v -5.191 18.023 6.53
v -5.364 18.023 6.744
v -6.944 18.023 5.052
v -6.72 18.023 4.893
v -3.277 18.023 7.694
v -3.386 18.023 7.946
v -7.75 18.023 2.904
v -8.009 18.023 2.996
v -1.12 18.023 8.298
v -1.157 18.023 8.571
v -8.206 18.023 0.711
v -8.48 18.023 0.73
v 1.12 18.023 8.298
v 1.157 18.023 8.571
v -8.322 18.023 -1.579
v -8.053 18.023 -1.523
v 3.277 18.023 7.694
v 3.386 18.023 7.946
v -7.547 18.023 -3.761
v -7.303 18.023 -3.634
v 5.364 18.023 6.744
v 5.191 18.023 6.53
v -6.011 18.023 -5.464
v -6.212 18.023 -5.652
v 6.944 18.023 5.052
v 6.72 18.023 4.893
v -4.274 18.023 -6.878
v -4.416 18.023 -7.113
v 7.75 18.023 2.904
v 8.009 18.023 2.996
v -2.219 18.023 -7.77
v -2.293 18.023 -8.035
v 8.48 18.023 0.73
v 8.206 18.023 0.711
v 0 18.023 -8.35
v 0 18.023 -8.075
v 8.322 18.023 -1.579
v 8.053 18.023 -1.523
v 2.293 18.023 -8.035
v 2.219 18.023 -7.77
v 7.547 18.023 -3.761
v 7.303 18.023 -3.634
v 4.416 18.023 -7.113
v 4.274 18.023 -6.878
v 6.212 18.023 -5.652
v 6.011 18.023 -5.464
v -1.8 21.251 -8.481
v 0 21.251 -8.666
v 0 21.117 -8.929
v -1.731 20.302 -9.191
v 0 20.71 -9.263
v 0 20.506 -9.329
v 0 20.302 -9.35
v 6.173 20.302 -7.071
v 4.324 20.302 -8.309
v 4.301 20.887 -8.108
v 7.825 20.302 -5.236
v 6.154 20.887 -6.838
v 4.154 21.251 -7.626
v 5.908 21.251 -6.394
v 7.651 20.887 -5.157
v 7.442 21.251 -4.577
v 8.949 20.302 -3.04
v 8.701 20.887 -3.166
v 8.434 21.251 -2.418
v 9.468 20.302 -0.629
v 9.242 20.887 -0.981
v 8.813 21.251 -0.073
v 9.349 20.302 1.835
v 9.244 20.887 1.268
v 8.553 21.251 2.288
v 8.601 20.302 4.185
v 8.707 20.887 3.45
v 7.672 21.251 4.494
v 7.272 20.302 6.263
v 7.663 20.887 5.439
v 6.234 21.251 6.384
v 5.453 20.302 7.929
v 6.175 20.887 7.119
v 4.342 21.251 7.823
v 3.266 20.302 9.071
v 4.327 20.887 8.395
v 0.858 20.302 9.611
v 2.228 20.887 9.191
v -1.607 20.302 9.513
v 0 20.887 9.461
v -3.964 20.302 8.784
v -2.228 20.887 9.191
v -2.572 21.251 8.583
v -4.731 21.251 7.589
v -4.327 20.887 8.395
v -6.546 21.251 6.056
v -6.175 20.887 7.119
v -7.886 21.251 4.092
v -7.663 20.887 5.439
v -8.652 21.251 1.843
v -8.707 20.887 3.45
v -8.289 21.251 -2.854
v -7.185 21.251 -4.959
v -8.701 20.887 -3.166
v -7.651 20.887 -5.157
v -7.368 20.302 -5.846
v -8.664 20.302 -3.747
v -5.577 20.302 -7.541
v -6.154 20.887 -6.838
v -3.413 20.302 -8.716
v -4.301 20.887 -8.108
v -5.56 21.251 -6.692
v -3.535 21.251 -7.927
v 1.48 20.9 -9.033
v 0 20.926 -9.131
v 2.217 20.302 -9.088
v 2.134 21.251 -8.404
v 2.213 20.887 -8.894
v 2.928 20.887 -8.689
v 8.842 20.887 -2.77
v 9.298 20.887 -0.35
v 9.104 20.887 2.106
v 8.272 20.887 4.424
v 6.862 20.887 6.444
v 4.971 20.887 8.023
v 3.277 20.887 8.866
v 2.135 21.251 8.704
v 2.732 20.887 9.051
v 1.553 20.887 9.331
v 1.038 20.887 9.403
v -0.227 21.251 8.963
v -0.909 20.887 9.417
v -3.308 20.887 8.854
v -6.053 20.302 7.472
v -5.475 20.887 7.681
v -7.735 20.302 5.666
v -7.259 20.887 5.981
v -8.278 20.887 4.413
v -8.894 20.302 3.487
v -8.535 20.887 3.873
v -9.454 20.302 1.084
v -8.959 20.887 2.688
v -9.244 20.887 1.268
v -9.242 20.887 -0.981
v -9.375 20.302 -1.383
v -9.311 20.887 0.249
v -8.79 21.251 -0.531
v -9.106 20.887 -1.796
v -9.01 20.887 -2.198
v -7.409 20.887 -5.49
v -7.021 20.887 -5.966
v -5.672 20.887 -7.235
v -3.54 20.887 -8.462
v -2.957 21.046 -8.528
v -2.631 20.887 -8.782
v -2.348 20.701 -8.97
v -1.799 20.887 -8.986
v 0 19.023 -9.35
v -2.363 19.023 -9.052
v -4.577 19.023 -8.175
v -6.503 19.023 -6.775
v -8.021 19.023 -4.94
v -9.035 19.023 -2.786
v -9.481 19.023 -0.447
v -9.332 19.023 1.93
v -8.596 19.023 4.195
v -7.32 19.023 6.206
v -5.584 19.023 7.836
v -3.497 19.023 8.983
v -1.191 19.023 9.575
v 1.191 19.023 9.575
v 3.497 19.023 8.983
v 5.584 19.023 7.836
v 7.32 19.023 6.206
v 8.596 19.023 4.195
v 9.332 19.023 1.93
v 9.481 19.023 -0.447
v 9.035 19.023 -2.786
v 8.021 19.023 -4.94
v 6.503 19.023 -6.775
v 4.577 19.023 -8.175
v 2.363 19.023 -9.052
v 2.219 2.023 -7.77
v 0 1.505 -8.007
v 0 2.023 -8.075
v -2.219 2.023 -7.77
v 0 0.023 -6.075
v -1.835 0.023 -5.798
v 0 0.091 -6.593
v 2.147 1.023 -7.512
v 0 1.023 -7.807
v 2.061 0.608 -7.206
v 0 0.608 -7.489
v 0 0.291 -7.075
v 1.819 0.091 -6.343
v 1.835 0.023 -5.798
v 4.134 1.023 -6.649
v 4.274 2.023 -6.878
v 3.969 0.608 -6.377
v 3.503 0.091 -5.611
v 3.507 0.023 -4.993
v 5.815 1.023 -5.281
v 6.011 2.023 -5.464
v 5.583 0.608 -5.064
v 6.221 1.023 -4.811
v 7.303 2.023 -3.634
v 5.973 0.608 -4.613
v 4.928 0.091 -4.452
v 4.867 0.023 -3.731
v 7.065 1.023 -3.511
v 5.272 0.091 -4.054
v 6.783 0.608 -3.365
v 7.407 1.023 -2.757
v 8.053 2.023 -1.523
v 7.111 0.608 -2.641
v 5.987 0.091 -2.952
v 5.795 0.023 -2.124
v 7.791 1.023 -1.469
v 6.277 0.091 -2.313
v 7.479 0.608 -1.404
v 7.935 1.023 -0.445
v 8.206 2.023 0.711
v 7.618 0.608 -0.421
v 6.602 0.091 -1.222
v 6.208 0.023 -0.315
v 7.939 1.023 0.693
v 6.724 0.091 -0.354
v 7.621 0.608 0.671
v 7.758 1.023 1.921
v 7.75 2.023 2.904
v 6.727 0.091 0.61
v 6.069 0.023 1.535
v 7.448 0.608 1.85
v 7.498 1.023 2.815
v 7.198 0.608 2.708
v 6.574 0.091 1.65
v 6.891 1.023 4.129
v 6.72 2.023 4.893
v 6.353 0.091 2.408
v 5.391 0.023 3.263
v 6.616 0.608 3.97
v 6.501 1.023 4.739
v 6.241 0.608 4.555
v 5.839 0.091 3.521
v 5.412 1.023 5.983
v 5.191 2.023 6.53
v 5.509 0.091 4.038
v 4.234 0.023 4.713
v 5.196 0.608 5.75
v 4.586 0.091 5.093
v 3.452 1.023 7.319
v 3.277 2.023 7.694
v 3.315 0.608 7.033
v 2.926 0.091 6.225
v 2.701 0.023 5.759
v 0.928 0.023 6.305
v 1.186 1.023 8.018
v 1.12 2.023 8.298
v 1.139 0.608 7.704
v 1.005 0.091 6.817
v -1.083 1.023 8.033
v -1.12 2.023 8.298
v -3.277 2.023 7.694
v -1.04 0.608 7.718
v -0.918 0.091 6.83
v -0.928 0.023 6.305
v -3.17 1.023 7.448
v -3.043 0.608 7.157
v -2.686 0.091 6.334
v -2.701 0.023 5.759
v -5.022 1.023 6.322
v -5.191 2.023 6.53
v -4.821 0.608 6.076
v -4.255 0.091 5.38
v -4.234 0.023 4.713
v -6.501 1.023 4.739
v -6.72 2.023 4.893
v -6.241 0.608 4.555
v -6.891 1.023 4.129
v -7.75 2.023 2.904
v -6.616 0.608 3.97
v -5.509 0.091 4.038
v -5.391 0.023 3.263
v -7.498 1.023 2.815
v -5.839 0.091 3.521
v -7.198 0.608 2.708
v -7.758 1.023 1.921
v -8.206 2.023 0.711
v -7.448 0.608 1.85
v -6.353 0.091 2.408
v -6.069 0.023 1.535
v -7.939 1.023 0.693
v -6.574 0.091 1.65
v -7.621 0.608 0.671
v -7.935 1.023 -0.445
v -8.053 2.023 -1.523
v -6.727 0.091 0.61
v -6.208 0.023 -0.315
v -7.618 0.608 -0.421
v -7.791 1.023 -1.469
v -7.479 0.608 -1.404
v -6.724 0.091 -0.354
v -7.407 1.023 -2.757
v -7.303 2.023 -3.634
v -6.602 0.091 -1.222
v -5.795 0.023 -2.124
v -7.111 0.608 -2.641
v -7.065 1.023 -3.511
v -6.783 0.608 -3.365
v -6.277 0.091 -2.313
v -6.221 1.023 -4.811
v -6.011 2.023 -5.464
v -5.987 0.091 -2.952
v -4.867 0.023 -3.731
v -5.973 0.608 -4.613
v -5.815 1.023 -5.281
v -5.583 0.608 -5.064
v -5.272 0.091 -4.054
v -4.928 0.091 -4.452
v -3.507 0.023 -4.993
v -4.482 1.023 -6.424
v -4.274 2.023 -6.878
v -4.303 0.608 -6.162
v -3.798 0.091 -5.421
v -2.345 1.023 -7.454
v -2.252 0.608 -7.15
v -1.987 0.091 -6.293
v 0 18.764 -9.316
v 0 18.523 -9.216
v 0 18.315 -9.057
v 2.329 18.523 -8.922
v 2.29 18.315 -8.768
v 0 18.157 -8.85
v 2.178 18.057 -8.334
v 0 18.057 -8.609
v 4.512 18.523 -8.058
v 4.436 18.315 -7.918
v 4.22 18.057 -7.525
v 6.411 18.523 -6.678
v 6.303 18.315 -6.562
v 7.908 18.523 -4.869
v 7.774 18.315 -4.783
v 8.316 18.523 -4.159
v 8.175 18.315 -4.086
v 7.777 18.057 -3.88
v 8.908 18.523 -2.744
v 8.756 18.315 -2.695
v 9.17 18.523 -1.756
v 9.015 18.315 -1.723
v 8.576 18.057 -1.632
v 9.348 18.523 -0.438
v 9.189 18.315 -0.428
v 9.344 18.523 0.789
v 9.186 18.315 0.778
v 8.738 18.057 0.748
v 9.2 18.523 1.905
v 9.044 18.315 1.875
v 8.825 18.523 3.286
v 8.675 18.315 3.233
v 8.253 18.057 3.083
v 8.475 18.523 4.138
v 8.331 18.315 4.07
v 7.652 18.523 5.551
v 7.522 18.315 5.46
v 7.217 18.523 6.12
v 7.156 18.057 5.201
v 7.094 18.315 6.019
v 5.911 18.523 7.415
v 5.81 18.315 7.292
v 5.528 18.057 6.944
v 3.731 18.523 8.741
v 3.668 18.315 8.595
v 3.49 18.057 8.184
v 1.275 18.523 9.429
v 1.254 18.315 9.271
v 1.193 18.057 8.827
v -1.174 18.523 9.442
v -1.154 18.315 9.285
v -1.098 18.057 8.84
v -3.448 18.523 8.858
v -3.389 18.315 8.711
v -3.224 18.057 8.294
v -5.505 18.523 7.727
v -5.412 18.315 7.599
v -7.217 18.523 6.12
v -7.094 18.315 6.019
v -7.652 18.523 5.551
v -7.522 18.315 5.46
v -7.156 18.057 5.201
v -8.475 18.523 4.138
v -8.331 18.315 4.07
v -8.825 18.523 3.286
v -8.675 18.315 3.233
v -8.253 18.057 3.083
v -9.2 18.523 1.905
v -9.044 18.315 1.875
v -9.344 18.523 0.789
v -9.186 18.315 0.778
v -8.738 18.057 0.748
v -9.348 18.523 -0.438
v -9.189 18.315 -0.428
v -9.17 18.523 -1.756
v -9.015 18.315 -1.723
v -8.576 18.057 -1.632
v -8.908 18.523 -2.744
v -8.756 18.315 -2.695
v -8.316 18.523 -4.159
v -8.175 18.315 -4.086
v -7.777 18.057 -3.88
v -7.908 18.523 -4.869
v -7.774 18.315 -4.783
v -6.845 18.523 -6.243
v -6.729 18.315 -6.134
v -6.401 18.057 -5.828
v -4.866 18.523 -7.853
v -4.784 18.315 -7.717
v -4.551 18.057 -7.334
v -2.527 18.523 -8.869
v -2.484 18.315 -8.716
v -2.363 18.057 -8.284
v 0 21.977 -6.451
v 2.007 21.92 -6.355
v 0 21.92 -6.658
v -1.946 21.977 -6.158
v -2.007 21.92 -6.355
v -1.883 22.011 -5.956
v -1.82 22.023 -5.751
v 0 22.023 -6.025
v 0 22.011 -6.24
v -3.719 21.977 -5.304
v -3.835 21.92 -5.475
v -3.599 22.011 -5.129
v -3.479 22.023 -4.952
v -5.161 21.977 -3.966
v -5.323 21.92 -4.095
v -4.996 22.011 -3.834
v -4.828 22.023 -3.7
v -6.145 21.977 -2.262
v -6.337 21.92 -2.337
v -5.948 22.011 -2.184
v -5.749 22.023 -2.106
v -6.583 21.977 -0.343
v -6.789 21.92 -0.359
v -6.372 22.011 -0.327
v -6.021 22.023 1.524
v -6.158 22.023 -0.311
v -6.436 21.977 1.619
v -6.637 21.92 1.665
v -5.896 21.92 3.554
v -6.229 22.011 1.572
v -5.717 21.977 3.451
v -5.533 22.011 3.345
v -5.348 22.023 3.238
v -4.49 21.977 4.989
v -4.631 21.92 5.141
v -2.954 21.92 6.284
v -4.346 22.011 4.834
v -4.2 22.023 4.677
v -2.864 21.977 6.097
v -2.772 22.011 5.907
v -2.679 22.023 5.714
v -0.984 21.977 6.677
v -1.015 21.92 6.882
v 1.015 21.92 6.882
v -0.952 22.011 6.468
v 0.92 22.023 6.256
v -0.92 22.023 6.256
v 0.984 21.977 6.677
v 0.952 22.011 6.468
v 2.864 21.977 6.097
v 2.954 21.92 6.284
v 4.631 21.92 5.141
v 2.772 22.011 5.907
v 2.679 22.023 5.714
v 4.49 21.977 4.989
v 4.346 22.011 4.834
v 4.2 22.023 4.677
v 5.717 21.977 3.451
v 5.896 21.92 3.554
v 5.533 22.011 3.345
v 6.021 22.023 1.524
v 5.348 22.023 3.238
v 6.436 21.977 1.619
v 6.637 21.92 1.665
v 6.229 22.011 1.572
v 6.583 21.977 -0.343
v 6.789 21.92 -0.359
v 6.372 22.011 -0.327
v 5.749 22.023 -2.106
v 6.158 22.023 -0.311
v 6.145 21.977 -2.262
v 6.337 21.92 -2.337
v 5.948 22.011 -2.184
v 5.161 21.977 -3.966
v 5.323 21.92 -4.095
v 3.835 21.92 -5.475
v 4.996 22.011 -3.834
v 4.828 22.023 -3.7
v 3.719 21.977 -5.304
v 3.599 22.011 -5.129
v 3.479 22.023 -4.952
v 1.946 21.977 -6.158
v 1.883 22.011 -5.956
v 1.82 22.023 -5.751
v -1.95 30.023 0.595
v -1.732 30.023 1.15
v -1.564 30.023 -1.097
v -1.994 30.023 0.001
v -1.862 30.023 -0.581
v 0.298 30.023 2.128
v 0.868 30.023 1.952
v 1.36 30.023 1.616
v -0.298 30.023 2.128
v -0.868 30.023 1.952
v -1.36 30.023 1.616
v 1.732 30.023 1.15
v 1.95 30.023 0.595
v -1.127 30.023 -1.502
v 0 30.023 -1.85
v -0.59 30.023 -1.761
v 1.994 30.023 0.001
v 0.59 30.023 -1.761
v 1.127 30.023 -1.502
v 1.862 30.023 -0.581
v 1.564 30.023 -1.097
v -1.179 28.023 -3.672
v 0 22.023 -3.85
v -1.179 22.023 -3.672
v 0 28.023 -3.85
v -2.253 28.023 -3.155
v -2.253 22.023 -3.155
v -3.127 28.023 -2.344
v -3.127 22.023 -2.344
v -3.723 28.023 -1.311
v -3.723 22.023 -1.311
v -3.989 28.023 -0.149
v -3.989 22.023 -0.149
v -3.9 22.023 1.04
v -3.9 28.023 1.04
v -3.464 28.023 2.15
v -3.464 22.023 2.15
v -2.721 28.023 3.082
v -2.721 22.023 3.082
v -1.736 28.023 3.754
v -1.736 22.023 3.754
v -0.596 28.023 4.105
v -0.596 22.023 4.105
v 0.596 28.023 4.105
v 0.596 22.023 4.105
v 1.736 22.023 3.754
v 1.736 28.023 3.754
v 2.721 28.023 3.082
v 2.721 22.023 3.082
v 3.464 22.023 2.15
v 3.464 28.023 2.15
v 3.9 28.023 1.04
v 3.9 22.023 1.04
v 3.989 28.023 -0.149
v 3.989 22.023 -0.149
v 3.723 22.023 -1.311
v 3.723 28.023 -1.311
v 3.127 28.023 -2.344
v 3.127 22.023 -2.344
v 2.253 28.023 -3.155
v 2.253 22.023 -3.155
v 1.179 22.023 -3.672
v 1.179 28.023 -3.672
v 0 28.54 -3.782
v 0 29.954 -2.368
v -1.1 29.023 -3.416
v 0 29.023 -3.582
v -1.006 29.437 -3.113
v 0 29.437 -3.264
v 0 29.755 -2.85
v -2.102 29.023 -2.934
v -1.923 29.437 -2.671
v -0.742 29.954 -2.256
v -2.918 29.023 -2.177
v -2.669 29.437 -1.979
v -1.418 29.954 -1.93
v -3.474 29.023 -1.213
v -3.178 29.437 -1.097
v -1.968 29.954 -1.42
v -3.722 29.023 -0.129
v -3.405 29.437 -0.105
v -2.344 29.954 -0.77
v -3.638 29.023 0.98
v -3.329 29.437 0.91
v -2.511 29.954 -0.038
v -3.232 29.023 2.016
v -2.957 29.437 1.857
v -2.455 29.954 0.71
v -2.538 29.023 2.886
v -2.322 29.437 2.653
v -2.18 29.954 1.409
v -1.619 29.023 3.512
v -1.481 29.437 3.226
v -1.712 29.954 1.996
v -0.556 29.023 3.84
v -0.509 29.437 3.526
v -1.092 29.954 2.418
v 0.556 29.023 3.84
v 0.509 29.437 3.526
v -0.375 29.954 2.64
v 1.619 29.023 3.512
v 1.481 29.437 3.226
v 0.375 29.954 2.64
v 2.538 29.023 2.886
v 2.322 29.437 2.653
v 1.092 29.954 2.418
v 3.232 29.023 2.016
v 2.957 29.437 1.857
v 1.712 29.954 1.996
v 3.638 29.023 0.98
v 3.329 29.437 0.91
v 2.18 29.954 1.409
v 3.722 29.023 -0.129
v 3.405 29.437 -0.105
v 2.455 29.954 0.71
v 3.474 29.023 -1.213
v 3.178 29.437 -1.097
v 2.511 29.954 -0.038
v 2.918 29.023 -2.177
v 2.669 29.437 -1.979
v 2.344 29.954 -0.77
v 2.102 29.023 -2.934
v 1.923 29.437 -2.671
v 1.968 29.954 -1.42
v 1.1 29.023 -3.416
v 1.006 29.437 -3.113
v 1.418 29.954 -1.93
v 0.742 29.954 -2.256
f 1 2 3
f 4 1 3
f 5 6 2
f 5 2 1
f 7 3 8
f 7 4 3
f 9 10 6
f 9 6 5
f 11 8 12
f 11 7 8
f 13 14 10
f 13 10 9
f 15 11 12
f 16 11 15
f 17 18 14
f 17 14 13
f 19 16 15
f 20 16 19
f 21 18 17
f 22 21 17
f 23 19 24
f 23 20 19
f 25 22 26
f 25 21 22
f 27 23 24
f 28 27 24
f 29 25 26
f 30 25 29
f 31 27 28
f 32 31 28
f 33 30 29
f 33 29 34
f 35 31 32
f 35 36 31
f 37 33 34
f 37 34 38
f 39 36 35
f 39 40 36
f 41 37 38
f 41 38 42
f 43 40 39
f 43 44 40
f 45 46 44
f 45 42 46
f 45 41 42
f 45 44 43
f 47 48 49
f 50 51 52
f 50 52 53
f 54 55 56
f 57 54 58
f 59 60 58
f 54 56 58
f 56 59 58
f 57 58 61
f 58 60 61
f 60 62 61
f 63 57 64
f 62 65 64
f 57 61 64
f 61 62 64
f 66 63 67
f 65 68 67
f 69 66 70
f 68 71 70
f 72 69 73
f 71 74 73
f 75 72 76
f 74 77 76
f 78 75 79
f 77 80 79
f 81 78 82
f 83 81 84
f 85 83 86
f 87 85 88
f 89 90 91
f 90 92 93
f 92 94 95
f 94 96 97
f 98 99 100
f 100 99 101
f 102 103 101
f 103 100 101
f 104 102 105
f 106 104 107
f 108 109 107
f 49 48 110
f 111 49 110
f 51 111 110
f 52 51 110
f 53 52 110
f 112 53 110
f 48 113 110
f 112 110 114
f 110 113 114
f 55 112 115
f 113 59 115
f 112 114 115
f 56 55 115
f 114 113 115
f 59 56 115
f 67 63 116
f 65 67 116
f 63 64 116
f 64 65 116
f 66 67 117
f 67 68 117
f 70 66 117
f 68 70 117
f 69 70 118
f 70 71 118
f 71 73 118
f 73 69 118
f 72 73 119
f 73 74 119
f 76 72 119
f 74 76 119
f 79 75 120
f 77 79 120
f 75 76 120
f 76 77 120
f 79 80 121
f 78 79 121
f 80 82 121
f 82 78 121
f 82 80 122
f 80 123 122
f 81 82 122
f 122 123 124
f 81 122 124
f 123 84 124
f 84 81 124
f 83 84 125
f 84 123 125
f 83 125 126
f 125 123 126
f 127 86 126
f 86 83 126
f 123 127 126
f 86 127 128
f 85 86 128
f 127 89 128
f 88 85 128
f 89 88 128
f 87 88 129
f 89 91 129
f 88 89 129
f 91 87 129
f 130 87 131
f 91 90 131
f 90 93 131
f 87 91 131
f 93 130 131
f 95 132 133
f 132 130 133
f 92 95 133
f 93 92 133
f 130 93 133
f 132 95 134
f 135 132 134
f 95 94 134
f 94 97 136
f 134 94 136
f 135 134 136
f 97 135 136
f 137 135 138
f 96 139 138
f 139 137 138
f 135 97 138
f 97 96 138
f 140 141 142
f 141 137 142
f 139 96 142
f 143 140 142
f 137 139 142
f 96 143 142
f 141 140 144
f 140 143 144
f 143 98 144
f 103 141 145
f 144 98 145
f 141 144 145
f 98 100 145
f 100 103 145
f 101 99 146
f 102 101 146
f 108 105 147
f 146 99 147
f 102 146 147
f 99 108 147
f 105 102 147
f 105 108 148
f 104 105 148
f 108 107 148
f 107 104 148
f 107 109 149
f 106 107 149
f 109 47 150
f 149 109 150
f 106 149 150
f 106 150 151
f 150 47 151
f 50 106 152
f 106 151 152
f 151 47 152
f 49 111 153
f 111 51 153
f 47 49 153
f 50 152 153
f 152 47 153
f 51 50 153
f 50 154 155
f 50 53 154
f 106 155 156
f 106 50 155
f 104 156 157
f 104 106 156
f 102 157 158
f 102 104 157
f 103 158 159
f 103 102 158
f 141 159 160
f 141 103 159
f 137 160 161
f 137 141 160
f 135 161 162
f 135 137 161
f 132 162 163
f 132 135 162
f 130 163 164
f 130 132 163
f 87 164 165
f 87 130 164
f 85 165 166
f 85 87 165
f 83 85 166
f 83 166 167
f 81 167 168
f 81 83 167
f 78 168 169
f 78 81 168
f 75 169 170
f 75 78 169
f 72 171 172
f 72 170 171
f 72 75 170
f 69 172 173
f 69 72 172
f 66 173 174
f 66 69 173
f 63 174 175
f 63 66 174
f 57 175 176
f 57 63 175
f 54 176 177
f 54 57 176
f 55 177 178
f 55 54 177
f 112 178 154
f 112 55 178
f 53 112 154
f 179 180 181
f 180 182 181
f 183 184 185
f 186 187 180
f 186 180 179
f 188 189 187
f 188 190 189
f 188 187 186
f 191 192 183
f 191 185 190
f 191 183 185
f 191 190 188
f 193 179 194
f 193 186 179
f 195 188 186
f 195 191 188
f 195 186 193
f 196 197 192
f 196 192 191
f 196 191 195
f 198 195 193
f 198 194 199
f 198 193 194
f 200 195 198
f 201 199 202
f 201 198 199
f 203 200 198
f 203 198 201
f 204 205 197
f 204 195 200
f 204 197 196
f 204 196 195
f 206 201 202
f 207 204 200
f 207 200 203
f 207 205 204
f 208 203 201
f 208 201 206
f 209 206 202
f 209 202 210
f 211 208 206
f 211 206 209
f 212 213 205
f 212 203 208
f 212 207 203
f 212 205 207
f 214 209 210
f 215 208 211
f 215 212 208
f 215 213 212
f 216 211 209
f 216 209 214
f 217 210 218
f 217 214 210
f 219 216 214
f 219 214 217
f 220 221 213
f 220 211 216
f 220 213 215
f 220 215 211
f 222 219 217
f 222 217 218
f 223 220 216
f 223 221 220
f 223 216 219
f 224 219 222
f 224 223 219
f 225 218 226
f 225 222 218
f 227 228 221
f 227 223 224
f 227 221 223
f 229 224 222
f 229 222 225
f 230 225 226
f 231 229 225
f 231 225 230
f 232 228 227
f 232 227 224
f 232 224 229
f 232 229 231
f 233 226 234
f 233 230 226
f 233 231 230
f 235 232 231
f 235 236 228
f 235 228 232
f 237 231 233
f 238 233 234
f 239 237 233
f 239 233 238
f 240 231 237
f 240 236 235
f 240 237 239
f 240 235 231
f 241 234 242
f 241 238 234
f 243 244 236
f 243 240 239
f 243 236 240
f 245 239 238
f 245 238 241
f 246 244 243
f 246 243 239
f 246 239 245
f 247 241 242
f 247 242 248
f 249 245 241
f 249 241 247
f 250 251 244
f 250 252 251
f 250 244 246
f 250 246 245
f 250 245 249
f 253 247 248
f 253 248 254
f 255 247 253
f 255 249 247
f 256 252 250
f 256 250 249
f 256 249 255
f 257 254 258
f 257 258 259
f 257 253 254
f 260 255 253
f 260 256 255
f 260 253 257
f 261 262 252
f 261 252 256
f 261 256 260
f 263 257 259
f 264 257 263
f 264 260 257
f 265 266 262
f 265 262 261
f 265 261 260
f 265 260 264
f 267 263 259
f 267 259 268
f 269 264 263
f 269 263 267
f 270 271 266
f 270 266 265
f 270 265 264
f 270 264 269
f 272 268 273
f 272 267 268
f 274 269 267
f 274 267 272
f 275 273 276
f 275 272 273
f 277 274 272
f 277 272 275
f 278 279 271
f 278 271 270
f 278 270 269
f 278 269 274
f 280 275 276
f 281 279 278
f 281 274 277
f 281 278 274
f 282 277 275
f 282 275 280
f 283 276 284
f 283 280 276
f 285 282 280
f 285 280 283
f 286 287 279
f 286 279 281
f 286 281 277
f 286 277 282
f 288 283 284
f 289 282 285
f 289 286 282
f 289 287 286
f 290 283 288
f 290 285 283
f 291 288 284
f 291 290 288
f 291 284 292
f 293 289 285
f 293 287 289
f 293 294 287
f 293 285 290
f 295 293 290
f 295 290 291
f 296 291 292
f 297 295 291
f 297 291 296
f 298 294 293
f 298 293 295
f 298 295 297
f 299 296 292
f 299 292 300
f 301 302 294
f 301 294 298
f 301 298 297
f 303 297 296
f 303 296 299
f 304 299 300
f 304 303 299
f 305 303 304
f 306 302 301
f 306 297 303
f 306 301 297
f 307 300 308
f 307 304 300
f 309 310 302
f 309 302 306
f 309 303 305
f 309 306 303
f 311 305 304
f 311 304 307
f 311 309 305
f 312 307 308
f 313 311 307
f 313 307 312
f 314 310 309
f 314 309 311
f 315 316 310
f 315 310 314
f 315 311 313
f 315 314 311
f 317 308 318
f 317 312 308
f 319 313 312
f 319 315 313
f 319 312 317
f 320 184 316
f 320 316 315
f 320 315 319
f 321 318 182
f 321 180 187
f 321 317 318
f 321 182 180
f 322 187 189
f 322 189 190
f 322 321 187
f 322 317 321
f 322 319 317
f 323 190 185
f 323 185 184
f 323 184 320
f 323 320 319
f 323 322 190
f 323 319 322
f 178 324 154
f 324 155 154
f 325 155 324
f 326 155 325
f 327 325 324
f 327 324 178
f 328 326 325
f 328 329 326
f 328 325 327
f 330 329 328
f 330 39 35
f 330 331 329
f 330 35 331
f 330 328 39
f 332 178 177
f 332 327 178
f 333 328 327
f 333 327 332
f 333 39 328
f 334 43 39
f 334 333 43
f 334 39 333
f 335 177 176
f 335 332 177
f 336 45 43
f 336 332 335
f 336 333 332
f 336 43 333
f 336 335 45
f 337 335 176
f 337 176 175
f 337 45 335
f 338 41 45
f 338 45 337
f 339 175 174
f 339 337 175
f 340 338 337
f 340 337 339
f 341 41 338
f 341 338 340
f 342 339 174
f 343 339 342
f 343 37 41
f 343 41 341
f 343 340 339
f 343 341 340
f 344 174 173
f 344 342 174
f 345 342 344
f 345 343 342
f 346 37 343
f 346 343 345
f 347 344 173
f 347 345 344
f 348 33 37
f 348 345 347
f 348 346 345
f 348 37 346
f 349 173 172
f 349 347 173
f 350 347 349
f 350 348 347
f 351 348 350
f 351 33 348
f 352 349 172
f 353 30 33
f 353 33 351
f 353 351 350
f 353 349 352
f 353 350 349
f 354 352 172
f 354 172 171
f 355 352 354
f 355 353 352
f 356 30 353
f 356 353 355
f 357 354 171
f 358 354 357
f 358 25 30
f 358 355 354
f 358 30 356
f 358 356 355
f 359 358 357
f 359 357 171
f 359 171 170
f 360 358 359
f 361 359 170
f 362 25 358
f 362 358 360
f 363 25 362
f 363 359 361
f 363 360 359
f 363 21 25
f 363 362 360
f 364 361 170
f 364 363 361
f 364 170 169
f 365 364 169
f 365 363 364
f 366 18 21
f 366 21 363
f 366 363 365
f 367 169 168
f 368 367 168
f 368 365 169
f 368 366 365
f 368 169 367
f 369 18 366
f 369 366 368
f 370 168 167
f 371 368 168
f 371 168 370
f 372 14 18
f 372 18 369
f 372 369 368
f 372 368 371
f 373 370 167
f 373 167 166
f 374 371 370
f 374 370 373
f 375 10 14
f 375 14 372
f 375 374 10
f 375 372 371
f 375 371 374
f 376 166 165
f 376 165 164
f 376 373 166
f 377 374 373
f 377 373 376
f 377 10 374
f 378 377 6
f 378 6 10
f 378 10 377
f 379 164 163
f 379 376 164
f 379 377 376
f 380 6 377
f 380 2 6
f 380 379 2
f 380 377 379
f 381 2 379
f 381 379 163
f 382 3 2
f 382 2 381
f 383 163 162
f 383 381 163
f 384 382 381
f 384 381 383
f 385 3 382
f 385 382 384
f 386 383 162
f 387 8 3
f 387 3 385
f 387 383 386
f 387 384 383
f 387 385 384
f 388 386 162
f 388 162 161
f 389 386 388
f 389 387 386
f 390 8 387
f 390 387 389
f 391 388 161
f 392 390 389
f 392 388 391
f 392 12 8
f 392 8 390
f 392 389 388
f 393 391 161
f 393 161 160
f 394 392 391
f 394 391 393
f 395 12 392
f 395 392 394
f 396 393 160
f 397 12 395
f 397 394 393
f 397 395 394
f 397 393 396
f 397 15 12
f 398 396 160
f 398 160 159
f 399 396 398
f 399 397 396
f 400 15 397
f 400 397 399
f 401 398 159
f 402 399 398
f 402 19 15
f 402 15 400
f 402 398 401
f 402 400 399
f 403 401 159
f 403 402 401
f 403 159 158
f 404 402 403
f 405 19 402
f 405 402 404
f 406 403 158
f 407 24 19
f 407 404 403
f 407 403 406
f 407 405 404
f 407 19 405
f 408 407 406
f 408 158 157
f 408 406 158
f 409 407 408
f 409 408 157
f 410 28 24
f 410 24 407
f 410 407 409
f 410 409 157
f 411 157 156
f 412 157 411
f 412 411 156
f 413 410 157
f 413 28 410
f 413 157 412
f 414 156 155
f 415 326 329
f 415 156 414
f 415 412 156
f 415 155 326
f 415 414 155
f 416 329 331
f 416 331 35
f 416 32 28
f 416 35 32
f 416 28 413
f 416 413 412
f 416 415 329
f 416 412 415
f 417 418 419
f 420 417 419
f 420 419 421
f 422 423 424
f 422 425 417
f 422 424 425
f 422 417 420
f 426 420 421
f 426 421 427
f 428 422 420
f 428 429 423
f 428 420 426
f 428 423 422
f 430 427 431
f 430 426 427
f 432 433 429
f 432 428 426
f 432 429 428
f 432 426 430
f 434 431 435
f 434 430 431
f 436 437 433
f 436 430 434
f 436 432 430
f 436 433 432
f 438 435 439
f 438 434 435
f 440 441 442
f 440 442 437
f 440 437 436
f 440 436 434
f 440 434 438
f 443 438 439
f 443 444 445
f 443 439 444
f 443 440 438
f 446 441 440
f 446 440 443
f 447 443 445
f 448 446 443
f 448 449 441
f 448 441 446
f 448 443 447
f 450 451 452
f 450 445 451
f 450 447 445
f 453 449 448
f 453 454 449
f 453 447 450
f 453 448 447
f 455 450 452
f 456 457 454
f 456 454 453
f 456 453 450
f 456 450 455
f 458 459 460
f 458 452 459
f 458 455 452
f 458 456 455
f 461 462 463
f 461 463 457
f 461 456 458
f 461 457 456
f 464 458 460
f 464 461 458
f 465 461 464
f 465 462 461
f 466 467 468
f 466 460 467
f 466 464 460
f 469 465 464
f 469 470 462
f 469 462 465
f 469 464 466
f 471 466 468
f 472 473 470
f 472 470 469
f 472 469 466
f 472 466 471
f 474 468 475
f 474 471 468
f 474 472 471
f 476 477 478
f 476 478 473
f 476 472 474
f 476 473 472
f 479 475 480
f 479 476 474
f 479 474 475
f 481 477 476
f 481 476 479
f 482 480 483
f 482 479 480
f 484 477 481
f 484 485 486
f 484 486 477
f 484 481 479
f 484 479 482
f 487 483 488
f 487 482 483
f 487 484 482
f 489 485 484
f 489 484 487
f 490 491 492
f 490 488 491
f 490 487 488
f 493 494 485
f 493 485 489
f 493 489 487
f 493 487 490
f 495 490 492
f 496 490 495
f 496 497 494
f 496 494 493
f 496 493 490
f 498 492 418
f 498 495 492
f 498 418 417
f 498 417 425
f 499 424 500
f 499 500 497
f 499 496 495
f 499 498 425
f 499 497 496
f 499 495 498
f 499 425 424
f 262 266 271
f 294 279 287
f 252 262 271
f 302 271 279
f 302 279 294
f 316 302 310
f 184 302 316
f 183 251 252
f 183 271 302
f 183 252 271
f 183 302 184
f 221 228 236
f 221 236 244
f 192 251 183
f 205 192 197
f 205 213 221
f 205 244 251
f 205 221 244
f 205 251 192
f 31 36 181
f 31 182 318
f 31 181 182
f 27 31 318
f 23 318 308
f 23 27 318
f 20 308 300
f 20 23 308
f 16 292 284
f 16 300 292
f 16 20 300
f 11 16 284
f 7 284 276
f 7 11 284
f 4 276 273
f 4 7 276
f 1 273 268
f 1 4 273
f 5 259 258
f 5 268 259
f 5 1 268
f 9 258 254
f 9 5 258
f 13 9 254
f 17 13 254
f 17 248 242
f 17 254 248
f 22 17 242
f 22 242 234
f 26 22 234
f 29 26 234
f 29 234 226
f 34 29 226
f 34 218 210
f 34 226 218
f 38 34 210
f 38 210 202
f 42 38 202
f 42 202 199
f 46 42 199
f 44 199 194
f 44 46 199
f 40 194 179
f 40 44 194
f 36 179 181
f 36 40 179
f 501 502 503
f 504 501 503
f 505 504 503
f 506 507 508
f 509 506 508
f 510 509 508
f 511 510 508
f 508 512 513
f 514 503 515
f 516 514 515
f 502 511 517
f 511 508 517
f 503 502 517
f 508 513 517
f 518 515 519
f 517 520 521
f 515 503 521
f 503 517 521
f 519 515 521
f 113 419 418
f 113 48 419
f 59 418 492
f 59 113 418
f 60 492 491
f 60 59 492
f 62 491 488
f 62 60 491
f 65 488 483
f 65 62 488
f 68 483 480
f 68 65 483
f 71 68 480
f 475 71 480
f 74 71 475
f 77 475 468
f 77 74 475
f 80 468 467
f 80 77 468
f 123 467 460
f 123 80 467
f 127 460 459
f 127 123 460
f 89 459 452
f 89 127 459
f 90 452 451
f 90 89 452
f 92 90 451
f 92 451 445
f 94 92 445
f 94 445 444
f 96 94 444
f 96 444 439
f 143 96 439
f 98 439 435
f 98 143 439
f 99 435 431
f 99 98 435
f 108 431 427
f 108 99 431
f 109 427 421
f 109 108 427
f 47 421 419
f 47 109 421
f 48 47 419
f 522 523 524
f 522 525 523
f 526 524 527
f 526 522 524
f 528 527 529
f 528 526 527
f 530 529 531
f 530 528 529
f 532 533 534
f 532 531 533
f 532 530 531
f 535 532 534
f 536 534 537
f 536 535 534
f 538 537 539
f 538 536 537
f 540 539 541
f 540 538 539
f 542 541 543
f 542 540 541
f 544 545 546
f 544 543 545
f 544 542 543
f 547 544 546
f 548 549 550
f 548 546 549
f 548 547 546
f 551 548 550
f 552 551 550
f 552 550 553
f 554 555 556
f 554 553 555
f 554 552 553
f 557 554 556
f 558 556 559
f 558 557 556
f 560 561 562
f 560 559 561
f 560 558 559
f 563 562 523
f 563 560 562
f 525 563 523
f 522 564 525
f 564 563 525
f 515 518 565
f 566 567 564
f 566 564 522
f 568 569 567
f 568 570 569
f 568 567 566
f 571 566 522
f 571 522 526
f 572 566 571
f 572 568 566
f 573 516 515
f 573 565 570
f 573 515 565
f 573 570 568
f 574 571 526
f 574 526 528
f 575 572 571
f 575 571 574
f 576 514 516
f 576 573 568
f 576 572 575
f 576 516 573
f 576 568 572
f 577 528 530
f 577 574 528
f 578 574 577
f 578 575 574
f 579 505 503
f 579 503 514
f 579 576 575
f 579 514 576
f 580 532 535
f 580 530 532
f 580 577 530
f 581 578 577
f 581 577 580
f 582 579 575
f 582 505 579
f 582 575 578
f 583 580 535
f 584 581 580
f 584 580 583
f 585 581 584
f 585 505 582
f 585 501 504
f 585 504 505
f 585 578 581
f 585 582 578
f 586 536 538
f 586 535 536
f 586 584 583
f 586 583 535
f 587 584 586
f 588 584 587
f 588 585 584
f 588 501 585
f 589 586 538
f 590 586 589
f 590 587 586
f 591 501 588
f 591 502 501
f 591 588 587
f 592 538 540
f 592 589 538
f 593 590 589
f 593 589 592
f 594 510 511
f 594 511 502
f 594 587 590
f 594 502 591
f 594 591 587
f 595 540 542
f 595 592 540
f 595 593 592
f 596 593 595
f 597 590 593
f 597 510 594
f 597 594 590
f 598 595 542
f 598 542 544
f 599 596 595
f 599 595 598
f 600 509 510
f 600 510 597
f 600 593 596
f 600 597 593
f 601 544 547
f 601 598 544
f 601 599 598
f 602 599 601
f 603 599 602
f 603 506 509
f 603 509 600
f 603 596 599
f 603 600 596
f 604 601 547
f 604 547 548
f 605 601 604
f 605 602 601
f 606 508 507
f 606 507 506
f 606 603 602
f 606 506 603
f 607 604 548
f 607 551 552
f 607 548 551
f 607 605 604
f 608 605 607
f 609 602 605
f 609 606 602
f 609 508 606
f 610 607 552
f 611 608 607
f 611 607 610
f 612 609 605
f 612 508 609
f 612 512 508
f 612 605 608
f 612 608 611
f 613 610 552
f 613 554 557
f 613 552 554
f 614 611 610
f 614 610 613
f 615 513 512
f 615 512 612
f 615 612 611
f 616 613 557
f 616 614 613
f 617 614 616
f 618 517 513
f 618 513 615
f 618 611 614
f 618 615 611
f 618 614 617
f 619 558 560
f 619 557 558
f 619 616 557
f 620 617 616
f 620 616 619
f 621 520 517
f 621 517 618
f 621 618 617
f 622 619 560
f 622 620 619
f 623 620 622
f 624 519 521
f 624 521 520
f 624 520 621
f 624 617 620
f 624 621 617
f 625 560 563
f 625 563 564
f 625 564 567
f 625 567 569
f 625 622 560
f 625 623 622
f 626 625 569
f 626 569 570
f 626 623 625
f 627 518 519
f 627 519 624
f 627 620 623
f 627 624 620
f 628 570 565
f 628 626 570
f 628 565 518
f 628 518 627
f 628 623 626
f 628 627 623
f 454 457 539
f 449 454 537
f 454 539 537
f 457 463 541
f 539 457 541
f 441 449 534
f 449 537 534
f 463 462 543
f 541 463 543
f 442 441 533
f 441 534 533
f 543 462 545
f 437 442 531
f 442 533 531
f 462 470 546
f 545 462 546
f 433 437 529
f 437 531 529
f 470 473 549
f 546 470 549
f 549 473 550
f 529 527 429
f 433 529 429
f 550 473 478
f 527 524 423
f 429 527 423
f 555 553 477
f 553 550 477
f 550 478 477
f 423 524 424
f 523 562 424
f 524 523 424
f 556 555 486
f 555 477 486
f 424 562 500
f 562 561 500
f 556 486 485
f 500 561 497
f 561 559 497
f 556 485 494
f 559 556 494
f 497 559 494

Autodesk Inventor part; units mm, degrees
ref_plane "YZ Plane" through (0, 0, 0) normal (1, 0, 0) x (0, 1, 0)
ref_plane "XZ Plane" through (0, 0, 0) normal (0, 1, 0) x (-1, 0, 0)
ref_plane "XY Plane" through (0, 0, 0) normal (0, 0, 1) x (1, 0, 0)
sketch "Sketch1" plane through (0, 0, 0) normal (1, 0, 0) x (0, 1, 0)
  line L0 (30.0226, 0.15) -> (0.0226, 0.15)
  line L1 (0.0226, -8.075) -> (18.0226, -8.075)
  line L2 (18.0226, -8.075) -> (18.0226, -9.35)
  line L3 (18.0226, -9.35) -> (21.0226, -9.35)
  line L4 (22.0226, -3.85) -> (30.0226, -3.85)
  line L5 (30.0226, -3.85) -> (30.0226, 0.15)
  line L6 (0.0226, 0.15) -> (0.0226, -8.075)
  line L7 (50.327, 0.15) -> (-8.0634, 0.15) construction
  line L8 (22.0226, -3.85) -> (22.0226, -6.35)
  line L9 (22.0226, -6.35) -> (21.0226, -9.35)
  point P0 (0, 0)
  dimension "d0" = 4
  dimension "d2" = 3
  dimension "d4" = 8
  dimension "d5" = 30
  dimension "d7" = 8.225
  dimension "d11" = 2.5
  dimension "d12" = 1
  dimension "d14" = 0
revolve "Revolution1" add sketch "Sketch1" angle 360 about axis through (0, 50.327, 0.15) along (0, -1, 0)
fillet "Fillet1" radius 1 2 edges at (0, 21.0226, 9.65) (0, 18.0226, 9.65)
fillet "Fillet2" radius 2 1 edges at (0, 30.0226, 4.15)
fillet "Fillet3" radius 2 1 edges at (0, 0.0226, 8.375)
fillet "Fillet4" radius 2 1 edges at (0, 22.0226, 6.65)
properties part number "ConexionDireccionTop"
